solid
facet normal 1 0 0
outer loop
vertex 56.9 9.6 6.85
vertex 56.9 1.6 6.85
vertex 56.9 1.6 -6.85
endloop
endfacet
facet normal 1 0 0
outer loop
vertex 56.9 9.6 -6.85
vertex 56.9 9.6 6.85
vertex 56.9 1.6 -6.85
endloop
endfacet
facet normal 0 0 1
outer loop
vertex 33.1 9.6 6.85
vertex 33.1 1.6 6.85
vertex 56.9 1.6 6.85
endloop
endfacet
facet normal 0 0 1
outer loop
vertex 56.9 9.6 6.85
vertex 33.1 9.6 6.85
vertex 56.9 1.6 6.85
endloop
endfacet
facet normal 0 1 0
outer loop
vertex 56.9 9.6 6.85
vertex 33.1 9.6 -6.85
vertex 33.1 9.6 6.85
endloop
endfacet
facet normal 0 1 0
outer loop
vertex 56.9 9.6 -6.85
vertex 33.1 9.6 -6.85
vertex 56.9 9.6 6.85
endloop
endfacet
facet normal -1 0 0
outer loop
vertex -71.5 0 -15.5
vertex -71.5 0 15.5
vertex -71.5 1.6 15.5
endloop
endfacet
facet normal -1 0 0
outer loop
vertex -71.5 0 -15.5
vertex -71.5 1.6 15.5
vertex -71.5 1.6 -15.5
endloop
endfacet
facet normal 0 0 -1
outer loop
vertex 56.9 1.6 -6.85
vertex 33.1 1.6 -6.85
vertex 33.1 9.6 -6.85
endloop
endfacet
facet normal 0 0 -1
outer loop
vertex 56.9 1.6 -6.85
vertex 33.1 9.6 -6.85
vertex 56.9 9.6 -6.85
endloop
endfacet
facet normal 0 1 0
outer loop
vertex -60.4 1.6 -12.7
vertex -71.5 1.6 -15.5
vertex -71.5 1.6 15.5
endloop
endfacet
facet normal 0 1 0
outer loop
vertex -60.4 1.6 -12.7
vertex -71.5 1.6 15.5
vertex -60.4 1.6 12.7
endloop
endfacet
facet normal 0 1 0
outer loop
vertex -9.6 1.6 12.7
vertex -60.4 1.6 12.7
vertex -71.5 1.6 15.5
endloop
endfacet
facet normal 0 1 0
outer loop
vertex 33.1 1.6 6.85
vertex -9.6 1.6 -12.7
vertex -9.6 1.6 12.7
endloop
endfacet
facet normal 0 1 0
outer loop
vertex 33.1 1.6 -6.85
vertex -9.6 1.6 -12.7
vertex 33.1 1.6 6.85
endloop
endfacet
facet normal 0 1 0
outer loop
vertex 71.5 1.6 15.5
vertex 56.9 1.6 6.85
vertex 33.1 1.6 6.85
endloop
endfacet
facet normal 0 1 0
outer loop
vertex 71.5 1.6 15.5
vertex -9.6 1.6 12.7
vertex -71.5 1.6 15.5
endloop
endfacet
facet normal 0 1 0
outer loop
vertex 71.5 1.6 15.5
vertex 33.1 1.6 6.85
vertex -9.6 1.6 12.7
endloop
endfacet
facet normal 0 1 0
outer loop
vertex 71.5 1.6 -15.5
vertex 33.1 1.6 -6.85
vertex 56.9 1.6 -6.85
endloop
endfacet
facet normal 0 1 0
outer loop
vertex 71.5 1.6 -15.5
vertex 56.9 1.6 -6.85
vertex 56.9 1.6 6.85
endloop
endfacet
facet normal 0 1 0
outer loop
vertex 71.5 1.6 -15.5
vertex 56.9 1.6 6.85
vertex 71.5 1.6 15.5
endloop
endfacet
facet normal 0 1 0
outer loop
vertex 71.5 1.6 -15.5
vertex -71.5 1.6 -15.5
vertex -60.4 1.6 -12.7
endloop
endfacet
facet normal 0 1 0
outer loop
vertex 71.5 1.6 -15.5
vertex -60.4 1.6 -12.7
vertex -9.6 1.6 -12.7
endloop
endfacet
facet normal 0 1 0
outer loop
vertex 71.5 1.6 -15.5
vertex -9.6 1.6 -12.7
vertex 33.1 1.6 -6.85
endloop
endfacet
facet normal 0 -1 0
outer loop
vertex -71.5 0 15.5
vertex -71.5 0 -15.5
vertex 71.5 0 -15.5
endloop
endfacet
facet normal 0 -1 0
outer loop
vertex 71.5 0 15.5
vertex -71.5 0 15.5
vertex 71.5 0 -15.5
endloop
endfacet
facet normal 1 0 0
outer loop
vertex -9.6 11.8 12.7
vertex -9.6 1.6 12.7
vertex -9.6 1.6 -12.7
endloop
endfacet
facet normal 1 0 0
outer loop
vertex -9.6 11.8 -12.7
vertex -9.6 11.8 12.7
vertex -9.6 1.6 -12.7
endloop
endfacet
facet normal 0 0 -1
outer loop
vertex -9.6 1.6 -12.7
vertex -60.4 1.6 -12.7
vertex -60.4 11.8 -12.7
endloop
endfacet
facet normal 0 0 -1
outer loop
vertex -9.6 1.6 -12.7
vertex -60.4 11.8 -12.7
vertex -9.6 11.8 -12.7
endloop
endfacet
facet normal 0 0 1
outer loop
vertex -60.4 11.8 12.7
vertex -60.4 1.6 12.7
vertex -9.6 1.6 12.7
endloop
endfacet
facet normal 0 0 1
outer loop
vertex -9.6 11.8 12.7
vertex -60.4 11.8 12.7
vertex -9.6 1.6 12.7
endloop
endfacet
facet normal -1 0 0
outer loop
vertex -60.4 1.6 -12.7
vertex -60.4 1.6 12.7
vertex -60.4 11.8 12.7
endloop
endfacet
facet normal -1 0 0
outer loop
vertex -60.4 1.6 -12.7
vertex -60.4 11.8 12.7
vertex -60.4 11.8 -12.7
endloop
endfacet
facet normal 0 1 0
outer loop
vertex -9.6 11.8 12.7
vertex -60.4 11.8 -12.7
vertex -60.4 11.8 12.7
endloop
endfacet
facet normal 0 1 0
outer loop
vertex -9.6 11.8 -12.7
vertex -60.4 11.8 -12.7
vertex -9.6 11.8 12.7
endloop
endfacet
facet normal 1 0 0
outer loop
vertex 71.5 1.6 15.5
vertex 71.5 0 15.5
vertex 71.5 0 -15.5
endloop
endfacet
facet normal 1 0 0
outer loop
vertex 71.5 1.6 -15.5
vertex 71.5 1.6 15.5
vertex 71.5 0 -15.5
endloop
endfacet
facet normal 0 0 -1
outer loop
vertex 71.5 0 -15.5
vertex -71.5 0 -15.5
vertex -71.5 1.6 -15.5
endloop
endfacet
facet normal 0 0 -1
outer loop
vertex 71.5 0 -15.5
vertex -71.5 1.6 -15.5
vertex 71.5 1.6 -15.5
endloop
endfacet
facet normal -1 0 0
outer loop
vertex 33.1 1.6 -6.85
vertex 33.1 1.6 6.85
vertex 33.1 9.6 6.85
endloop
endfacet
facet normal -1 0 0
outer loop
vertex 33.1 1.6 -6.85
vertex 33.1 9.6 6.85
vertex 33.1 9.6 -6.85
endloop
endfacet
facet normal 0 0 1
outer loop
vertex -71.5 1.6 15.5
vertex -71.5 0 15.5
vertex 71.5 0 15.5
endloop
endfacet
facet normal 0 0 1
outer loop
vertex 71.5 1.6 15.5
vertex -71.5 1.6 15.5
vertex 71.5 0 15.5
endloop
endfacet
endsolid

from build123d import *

# Parameters (mm, degrees)
SKETCH1_W           = 143
SKETCH1_H           = 31
BOSS_EXTRUDE1_DEPTH = 1.6
SKETCH2_W           = 23.8
SKETCH2_H           = 13.7
BOSS_EXTRUDE2_DEPTH = 8
SKETCH3_W           = 50.8
SKETCH3_H           = 25.4
BOSS_EXTRUDE3_DEPTH = 10.2


with BuildPart() as part:
    # Sketch1 → Boss-Extrude1 (new body)
    with BuildSketch(Plane(origin=(0, 0, 0), x_dir=(1, 0, 0), z_dir=(0, 1, 0))):
        Rectangle(SKETCH1_W, SKETCH1_H)
    extrude(amount=BOSS_EXTRUDE1_DEPTH)

    # Sketch2 → Boss-Extrude2 (add)
    with BuildSketch(Plane(origin=(0, 1.6, 0), x_dir=(1, 0, 0), z_dir=(0, 1, 0))):
        with Locations((45, 0)):
            Rectangle(SKETCH2_W, SKETCH2_H)
    extrude(amount=BOSS_EXTRUDE2_DEPTH)

    # Sketch3 → Boss-Extrude3 (add)
    with BuildSketch(Plane(origin=(0, 1.6, 0), x_dir=(1, 0, 0), z_dir=(0, 1, 0))):
        with Locations((-35, 0)):
            Rectangle(SKETCH3_W, SKETCH3_H)
    extrude(amount=BOSS_EXTRUDE3_DEPTH)


solid = part.part
